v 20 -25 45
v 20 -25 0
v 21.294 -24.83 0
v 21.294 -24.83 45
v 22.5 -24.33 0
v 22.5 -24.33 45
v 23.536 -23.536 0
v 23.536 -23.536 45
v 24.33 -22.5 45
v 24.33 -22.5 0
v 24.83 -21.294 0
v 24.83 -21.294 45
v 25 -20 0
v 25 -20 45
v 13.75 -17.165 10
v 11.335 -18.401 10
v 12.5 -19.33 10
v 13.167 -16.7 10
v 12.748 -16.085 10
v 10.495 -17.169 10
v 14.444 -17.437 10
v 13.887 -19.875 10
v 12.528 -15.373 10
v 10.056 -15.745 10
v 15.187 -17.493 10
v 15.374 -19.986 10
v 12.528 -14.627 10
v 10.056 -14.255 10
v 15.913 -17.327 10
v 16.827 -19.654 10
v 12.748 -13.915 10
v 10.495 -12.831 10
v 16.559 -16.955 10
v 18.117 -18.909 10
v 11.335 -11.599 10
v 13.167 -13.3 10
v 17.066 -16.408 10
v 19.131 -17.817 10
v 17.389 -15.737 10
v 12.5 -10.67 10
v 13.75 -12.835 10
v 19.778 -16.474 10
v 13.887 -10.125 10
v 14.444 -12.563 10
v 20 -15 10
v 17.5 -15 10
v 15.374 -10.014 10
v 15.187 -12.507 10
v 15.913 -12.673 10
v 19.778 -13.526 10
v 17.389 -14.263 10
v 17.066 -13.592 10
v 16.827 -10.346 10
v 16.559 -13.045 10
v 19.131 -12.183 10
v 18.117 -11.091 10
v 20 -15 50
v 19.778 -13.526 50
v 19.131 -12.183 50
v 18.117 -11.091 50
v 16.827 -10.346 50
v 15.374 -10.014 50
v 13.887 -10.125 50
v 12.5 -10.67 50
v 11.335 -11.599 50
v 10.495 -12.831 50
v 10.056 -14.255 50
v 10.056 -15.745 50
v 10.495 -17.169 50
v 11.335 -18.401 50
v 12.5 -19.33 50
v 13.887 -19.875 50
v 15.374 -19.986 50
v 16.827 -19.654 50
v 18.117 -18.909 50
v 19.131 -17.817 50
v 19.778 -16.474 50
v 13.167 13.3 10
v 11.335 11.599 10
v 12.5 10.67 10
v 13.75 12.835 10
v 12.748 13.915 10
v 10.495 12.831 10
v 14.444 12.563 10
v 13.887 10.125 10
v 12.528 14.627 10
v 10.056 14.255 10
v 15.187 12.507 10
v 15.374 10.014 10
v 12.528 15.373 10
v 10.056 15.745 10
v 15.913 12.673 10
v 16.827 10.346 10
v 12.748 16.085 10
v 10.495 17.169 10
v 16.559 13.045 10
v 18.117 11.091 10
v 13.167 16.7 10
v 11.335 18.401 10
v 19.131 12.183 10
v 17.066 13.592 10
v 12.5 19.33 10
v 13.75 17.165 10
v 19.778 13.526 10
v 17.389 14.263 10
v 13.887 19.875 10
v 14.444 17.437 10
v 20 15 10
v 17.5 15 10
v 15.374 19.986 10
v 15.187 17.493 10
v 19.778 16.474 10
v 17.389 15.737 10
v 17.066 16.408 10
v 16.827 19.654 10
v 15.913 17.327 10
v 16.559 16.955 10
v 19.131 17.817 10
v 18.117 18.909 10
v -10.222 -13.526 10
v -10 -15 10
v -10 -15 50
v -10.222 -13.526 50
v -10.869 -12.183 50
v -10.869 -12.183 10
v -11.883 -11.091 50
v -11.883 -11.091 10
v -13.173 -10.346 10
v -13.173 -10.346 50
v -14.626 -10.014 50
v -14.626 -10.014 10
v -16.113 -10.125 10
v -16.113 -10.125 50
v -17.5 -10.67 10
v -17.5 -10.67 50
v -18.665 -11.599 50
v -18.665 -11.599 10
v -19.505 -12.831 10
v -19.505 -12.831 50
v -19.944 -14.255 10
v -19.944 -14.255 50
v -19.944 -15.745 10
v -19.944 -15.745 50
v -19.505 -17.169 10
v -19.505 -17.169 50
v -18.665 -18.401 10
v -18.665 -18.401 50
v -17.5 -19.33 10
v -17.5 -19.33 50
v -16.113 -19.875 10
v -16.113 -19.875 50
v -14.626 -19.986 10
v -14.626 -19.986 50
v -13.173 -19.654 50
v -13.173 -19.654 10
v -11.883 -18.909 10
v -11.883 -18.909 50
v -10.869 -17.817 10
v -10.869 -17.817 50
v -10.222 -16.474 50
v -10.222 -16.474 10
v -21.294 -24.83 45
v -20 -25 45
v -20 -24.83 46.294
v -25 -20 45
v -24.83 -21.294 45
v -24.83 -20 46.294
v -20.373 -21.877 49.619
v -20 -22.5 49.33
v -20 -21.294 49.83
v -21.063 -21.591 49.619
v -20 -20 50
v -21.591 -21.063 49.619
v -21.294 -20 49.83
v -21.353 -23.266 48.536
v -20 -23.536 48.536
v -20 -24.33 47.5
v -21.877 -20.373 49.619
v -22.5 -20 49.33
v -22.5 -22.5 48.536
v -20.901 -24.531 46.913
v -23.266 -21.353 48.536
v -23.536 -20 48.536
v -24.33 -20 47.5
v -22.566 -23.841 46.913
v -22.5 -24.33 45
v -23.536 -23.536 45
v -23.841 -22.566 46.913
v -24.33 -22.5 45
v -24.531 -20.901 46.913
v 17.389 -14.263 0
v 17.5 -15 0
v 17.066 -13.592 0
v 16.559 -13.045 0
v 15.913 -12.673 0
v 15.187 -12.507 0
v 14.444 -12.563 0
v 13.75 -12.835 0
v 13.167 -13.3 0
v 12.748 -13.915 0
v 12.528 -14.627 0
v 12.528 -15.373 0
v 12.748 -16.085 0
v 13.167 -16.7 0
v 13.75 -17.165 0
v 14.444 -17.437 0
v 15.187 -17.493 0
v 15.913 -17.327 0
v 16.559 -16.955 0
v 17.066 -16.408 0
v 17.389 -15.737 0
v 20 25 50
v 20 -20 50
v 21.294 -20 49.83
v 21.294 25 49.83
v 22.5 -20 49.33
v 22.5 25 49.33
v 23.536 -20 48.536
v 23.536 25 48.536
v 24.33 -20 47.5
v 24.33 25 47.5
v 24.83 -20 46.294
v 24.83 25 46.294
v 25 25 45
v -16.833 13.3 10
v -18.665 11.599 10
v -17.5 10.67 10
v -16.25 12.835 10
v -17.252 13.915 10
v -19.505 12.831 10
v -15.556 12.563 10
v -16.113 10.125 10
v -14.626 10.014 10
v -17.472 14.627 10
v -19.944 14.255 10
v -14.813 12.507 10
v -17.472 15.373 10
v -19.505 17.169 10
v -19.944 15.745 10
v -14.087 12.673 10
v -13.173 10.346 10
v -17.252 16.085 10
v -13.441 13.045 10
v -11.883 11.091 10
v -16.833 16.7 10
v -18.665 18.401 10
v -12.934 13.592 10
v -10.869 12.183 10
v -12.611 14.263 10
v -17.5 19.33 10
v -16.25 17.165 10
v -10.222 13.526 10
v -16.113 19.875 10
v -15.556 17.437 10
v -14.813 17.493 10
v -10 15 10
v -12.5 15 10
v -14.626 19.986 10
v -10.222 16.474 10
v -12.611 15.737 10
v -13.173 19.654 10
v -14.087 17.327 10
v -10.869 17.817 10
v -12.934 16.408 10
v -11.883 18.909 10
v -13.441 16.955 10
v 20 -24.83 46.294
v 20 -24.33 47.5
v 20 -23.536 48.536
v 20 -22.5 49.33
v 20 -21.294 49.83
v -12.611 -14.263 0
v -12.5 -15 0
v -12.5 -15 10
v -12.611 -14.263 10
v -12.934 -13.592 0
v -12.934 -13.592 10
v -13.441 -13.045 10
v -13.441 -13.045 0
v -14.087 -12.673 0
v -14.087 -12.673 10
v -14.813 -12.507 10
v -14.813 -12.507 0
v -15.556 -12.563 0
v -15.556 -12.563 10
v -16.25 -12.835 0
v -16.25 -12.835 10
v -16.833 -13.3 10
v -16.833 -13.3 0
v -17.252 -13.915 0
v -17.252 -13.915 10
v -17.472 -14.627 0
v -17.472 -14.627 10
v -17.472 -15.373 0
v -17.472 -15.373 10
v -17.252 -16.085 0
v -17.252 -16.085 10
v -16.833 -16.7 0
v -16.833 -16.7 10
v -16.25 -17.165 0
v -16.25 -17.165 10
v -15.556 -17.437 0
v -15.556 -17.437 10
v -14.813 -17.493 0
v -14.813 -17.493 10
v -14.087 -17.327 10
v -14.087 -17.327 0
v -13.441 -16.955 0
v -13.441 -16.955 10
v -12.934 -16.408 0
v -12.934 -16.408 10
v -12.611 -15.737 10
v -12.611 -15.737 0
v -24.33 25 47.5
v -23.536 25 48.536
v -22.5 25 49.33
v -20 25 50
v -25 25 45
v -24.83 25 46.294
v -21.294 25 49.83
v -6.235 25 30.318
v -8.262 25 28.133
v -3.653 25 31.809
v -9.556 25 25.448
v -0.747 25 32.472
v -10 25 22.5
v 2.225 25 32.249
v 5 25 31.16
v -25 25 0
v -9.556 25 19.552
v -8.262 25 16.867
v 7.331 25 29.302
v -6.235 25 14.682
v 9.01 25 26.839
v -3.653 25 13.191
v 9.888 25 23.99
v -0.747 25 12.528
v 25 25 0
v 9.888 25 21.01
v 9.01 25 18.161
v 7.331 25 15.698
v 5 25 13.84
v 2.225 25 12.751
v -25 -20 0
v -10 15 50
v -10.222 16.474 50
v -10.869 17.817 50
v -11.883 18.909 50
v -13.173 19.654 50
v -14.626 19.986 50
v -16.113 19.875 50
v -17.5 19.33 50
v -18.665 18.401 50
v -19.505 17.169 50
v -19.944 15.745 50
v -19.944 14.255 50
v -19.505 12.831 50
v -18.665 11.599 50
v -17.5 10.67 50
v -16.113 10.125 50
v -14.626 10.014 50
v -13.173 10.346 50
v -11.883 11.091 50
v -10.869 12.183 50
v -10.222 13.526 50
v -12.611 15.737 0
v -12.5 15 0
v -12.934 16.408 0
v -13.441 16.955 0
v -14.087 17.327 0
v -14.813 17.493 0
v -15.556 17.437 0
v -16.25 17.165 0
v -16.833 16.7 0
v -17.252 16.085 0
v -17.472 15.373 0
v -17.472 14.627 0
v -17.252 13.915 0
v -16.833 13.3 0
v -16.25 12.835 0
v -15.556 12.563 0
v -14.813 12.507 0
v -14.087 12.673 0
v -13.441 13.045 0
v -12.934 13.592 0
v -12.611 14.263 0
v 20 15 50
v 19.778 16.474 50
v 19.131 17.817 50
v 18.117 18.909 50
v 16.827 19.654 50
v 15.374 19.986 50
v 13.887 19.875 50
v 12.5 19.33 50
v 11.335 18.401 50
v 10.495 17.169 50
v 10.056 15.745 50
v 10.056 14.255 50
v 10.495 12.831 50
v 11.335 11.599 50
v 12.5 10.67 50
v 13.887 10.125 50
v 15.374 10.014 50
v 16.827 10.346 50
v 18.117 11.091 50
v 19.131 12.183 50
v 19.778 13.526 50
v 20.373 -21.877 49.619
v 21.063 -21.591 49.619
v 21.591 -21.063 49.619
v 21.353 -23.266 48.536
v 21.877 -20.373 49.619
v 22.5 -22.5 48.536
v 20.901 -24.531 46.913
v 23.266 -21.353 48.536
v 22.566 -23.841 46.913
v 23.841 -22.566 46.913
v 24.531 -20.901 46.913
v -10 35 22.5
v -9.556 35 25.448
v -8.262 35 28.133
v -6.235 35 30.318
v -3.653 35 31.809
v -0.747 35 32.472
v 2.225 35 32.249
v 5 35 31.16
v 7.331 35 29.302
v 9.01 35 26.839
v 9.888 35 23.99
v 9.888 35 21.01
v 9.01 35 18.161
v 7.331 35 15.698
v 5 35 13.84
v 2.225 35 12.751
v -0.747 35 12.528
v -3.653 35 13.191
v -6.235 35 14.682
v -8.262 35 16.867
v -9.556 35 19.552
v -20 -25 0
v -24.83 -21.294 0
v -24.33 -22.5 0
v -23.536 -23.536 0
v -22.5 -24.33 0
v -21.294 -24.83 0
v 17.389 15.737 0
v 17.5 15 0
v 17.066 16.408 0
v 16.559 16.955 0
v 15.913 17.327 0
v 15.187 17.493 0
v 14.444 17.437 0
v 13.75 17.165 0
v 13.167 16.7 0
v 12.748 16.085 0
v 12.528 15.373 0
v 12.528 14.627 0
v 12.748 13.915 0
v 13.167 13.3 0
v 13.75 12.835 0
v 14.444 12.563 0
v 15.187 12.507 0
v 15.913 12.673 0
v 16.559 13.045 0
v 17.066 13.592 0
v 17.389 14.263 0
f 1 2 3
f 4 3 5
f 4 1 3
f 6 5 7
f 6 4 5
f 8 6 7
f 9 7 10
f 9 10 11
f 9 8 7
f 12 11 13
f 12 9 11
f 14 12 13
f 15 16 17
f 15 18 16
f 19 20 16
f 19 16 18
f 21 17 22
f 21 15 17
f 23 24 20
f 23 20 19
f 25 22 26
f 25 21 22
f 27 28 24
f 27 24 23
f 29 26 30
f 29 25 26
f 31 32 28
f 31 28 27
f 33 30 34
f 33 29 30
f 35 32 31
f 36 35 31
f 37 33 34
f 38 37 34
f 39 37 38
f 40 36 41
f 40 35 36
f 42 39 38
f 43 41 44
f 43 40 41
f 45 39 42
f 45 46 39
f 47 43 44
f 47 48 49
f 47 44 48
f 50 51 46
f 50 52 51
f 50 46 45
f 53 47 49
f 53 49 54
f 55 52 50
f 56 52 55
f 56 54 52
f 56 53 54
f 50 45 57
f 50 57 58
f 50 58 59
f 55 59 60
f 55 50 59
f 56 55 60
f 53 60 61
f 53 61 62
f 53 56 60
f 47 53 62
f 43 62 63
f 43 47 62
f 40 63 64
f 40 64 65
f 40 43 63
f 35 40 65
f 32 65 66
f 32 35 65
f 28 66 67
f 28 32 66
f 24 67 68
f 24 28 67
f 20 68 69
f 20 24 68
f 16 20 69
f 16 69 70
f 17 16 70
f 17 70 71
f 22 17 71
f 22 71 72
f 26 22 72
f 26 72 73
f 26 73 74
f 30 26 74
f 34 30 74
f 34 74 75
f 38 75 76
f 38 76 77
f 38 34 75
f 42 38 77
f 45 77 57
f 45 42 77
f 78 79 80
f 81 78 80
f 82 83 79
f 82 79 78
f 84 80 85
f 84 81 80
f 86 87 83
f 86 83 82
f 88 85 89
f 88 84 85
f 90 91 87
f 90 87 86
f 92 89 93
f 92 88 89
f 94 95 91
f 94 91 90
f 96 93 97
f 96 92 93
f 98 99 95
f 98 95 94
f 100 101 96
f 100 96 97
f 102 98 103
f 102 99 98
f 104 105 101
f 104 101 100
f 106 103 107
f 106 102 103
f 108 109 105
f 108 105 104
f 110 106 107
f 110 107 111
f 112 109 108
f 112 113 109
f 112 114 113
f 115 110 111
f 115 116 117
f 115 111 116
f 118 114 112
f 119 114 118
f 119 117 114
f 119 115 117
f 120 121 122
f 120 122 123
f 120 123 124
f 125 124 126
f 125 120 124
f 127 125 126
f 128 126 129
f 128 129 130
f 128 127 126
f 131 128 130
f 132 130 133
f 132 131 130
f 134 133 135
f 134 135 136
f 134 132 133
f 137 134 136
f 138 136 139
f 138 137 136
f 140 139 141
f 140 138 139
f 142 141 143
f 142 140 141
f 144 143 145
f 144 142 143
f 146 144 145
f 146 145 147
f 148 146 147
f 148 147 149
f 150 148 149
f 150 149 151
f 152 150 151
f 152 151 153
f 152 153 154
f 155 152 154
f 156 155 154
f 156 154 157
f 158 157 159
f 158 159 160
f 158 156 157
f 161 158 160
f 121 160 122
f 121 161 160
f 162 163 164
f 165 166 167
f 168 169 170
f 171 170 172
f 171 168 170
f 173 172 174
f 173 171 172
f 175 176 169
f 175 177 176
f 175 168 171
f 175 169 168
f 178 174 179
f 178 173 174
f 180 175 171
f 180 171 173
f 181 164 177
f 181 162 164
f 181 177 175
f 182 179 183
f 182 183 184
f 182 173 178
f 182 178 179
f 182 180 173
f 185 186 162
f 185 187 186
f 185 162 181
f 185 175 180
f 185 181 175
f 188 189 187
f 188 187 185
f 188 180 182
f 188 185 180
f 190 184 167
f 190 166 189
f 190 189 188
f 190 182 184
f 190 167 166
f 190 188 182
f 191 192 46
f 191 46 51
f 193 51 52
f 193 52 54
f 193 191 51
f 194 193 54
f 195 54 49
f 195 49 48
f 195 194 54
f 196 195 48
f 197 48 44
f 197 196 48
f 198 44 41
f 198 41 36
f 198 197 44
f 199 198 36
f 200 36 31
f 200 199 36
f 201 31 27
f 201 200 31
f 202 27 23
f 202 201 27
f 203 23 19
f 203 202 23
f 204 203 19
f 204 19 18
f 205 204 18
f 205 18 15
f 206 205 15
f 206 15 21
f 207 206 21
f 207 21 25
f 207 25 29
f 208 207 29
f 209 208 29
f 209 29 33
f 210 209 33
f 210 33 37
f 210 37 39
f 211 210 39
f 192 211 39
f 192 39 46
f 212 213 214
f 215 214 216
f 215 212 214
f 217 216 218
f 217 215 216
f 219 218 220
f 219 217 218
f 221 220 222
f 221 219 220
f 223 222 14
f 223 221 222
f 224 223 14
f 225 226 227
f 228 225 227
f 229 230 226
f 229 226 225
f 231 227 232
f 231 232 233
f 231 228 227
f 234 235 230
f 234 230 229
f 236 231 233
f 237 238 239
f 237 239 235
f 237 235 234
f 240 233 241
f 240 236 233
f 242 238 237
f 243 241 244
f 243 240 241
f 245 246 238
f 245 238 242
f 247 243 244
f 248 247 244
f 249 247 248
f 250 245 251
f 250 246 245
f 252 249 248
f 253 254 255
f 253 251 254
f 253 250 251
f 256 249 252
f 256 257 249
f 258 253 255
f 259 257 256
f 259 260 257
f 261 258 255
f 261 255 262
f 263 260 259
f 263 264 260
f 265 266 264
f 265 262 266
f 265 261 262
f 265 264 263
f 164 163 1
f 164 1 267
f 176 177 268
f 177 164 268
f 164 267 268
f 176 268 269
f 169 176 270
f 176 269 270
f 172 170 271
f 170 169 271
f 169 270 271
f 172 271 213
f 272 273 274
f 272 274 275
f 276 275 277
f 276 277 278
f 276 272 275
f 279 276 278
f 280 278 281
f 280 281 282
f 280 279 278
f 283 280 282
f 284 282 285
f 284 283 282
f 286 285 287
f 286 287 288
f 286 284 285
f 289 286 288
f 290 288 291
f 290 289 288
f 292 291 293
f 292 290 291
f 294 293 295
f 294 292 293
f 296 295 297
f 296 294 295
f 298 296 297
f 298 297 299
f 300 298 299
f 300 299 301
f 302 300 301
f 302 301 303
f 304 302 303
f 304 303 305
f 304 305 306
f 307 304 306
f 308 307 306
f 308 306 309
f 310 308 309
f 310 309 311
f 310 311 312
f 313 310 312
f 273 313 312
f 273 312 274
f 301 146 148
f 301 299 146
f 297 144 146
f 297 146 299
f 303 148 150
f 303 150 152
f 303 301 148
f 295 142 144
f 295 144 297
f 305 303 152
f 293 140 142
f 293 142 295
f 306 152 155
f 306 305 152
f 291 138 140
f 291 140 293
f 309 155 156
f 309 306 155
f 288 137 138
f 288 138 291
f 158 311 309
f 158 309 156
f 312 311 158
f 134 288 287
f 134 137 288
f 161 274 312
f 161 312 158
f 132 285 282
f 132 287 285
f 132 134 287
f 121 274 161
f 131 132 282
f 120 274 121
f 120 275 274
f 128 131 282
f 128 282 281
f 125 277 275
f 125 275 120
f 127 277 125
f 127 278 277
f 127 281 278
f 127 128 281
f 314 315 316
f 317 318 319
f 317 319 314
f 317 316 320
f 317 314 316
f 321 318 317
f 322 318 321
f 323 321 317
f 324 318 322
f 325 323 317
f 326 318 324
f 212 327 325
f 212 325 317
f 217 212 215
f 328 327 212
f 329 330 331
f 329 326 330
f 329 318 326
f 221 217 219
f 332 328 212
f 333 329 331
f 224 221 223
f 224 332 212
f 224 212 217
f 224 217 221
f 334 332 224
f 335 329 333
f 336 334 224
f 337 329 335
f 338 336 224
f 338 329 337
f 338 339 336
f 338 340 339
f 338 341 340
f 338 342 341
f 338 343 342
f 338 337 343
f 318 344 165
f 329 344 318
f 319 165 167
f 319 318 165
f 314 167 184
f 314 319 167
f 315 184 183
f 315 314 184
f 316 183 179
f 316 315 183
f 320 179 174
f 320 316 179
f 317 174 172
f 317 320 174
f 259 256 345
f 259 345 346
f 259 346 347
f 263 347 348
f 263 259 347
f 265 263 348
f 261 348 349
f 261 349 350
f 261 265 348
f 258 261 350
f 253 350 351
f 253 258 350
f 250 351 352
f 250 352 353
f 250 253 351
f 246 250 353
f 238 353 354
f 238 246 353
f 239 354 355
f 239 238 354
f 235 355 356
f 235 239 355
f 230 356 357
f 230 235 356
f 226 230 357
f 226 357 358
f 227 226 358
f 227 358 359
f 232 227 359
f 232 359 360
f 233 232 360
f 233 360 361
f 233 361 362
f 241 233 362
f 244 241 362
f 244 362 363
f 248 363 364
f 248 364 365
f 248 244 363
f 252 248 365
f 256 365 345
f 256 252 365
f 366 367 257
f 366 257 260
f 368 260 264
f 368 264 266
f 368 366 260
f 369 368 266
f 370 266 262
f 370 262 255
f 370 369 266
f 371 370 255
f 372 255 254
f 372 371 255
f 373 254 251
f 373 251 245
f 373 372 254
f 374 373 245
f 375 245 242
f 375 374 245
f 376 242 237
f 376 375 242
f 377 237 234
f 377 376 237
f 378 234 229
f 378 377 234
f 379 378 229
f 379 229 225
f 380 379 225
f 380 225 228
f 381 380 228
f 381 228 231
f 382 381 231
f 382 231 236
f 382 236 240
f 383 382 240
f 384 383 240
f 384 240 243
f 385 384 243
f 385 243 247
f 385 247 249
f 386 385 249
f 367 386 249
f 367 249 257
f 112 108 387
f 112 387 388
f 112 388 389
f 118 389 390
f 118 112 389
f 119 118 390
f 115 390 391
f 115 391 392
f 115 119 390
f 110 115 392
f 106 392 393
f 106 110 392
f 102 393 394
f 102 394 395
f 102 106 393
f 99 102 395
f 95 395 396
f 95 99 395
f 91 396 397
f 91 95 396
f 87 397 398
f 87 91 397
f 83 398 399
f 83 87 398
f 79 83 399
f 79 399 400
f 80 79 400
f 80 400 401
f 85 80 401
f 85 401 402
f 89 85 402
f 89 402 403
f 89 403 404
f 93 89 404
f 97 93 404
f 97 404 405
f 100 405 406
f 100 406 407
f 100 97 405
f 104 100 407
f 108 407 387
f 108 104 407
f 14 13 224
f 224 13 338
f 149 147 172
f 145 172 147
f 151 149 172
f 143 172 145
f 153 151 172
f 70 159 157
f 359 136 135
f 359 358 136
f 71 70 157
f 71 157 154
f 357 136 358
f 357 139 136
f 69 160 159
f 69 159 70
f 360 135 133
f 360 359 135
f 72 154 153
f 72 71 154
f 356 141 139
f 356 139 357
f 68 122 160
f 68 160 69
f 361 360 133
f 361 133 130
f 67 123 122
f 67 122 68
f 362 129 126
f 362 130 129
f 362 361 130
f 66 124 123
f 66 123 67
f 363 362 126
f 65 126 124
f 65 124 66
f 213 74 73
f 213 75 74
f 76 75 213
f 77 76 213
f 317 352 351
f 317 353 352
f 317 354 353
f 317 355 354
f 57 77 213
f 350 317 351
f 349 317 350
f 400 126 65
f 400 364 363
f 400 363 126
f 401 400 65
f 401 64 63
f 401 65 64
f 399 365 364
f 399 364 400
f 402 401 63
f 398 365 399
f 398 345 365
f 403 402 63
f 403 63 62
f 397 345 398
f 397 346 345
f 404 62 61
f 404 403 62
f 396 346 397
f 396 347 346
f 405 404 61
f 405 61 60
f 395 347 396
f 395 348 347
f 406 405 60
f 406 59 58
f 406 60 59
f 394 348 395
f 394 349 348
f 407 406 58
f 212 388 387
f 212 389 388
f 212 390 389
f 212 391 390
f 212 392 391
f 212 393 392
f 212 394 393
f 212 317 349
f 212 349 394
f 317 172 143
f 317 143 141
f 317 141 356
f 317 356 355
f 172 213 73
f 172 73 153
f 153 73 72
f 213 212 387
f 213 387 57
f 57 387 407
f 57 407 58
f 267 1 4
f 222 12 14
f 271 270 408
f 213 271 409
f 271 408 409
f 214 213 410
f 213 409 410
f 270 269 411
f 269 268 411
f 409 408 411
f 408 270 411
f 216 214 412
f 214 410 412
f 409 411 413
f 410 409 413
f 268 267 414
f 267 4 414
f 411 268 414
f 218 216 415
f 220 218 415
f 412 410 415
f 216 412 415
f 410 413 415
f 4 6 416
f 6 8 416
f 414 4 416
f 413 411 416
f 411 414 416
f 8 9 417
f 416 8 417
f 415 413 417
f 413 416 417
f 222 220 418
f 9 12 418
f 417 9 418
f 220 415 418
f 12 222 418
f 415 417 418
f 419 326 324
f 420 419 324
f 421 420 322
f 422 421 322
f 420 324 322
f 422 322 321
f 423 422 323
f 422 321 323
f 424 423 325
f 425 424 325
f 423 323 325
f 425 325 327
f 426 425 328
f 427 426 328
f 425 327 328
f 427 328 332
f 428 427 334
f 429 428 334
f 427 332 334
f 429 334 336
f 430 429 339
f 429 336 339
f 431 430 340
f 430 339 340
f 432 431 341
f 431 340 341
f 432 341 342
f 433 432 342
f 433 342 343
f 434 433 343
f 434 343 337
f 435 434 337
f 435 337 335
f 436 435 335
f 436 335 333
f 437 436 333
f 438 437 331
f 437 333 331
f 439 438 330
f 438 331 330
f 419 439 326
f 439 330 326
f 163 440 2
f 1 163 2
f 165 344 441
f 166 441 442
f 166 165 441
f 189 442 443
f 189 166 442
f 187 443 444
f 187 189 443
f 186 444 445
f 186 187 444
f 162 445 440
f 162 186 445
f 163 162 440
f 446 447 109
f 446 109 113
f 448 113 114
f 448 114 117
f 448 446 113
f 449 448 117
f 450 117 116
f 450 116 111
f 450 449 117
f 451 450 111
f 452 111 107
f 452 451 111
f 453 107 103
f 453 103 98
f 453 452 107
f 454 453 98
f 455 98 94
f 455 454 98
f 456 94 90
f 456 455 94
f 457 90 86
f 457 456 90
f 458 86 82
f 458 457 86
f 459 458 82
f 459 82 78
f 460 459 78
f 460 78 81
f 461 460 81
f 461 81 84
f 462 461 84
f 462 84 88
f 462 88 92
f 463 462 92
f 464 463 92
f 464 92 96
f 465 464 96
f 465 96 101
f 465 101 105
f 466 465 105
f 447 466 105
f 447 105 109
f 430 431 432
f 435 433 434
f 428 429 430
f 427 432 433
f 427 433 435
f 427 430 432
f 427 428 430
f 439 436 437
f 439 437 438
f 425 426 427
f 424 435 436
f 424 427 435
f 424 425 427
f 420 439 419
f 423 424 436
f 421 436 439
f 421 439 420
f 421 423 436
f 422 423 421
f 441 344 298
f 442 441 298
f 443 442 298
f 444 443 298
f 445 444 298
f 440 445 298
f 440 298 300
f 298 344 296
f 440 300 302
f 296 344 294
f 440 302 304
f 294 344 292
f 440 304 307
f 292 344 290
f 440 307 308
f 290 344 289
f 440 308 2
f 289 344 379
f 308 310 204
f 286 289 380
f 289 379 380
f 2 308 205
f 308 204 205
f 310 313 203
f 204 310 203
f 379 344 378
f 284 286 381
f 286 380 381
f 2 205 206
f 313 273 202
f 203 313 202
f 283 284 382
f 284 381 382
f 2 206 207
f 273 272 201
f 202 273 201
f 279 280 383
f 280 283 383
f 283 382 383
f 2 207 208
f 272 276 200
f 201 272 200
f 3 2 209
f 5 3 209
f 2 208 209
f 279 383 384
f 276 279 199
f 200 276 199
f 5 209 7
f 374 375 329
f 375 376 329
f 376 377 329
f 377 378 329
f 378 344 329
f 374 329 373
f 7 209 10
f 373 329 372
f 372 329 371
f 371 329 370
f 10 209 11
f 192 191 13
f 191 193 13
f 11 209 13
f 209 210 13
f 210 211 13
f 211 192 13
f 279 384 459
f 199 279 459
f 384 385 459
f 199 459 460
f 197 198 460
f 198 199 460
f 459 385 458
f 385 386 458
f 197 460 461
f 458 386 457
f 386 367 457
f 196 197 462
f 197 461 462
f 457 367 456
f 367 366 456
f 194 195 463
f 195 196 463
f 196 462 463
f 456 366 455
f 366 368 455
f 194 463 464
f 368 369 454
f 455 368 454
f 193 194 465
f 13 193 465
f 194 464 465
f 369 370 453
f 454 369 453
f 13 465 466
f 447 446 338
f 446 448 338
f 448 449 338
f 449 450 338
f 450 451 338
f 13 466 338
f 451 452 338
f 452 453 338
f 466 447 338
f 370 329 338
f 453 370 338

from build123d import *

# Parameters (mm, degrees)
F0_W     = 50
F0_H     = 50
F0_R     = 5
F0_R_2   = 2.5
F1_DEPTH = 50
F2_START = 10
F2_DEPTH = 40
F3_R     = 4.99999
F4_R     = 10
F5_DEPTH = 10


# Not quite as in the source:
# - a fillet or chamfer is up to 0.001 mm smaller than in the source, because OpenCascade refuses the exact size


with BuildPart() as f1:
    # F0 (on Top) → F1 (new body)
    with BuildSketch(Plane.XY):
        Rectangle(F0_W, F0_H)
        with Locations((-15, -15)):
            Circle(F0_R, mode=Mode.SUBTRACT)
        with Locations((15, -15)):
            Circle(F0_R, mode=Mode.SUBTRACT)
        with Locations((-15, 15)):
            Circle(F0_R, mode=Mode.SUBTRACT)
        with Locations((15, 15)):
            Circle(F0_R, mode=Mode.SUBTRACT)
        with Locations((-15, -15)):
            Circle(F0_R)
        with Locations((-15, -15)):
            Circle(F0_R_2, mode=Mode.SUBTRACT)
        with Locations((-15, 15)):
            Circle(F0_R)
        with Locations((-15, 15)):
            Circle(F0_R_2, mode=Mode.SUBTRACT)
        with Locations((15, 15)):
            Circle(F0_R)
        with Locations((15, 15)):
            Circle(F0_R_2, mode=Mode.SUBTRACT)
        with Locations((15, -15)):
            Circle(F0_R)
        with Locations((15, -15)):
            Circle(F0_R_2, mode=Mode.SUBTRACT)
    extrude(amount=F1_DEPTH)

    # F0 (on Top) → F2 (cut)
    with BuildSketch(Plane.XY.offset(F2_START)):
        with Locations((-15, -15)):
            Circle(F0_R)
        with Locations((-15, -15)):
            Circle(F0_R_2, mode=Mode.SUBTRACT)
        with Locations((-15, 15)):
            Circle(F0_R)
        with Locations((-15, 15)):
            Circle(F0_R_2, mode=Mode.SUBTRACT)
        with Locations((15, -15)):
            Circle(F0_R)
        with Locations((15, -15)):
            Circle(F0_R_2, mode=Mode.SUBTRACT)
        with Locations((15, 15)):
            Circle(F0_R)
        with Locations((15, 15)):
            Circle(F0_R_2, mode=Mode.SUBTRACT)
    extrude(amount=F2_DEPTH, mode=Mode.SUBTRACT)

    # F3 (radius 5 in the source; OpenCascade refuses exactly that, so slightly less here)
    f3_edges = [f1.edges().sort_by_distance(p)[0] for p in [
        (-25, -25, 25),
        (25, -25, 25),
        (0, -25, 50),
        (-25, 0, 50),
        (25, 0, 50),
    ]]
    fillet(f3_edges, radius=F3_R)

    # F4 (on face) → F5 (join)
    with BuildSketch(Plane(origin=(0, 25, 0), x_dir=(-1, 0, 0), z_dir=(0, 1, 0))):
        with Locations((0, 22.5)):
            Circle(F4_R)
    extrude(amount=F5_DEPTH)


solid = f1.part
